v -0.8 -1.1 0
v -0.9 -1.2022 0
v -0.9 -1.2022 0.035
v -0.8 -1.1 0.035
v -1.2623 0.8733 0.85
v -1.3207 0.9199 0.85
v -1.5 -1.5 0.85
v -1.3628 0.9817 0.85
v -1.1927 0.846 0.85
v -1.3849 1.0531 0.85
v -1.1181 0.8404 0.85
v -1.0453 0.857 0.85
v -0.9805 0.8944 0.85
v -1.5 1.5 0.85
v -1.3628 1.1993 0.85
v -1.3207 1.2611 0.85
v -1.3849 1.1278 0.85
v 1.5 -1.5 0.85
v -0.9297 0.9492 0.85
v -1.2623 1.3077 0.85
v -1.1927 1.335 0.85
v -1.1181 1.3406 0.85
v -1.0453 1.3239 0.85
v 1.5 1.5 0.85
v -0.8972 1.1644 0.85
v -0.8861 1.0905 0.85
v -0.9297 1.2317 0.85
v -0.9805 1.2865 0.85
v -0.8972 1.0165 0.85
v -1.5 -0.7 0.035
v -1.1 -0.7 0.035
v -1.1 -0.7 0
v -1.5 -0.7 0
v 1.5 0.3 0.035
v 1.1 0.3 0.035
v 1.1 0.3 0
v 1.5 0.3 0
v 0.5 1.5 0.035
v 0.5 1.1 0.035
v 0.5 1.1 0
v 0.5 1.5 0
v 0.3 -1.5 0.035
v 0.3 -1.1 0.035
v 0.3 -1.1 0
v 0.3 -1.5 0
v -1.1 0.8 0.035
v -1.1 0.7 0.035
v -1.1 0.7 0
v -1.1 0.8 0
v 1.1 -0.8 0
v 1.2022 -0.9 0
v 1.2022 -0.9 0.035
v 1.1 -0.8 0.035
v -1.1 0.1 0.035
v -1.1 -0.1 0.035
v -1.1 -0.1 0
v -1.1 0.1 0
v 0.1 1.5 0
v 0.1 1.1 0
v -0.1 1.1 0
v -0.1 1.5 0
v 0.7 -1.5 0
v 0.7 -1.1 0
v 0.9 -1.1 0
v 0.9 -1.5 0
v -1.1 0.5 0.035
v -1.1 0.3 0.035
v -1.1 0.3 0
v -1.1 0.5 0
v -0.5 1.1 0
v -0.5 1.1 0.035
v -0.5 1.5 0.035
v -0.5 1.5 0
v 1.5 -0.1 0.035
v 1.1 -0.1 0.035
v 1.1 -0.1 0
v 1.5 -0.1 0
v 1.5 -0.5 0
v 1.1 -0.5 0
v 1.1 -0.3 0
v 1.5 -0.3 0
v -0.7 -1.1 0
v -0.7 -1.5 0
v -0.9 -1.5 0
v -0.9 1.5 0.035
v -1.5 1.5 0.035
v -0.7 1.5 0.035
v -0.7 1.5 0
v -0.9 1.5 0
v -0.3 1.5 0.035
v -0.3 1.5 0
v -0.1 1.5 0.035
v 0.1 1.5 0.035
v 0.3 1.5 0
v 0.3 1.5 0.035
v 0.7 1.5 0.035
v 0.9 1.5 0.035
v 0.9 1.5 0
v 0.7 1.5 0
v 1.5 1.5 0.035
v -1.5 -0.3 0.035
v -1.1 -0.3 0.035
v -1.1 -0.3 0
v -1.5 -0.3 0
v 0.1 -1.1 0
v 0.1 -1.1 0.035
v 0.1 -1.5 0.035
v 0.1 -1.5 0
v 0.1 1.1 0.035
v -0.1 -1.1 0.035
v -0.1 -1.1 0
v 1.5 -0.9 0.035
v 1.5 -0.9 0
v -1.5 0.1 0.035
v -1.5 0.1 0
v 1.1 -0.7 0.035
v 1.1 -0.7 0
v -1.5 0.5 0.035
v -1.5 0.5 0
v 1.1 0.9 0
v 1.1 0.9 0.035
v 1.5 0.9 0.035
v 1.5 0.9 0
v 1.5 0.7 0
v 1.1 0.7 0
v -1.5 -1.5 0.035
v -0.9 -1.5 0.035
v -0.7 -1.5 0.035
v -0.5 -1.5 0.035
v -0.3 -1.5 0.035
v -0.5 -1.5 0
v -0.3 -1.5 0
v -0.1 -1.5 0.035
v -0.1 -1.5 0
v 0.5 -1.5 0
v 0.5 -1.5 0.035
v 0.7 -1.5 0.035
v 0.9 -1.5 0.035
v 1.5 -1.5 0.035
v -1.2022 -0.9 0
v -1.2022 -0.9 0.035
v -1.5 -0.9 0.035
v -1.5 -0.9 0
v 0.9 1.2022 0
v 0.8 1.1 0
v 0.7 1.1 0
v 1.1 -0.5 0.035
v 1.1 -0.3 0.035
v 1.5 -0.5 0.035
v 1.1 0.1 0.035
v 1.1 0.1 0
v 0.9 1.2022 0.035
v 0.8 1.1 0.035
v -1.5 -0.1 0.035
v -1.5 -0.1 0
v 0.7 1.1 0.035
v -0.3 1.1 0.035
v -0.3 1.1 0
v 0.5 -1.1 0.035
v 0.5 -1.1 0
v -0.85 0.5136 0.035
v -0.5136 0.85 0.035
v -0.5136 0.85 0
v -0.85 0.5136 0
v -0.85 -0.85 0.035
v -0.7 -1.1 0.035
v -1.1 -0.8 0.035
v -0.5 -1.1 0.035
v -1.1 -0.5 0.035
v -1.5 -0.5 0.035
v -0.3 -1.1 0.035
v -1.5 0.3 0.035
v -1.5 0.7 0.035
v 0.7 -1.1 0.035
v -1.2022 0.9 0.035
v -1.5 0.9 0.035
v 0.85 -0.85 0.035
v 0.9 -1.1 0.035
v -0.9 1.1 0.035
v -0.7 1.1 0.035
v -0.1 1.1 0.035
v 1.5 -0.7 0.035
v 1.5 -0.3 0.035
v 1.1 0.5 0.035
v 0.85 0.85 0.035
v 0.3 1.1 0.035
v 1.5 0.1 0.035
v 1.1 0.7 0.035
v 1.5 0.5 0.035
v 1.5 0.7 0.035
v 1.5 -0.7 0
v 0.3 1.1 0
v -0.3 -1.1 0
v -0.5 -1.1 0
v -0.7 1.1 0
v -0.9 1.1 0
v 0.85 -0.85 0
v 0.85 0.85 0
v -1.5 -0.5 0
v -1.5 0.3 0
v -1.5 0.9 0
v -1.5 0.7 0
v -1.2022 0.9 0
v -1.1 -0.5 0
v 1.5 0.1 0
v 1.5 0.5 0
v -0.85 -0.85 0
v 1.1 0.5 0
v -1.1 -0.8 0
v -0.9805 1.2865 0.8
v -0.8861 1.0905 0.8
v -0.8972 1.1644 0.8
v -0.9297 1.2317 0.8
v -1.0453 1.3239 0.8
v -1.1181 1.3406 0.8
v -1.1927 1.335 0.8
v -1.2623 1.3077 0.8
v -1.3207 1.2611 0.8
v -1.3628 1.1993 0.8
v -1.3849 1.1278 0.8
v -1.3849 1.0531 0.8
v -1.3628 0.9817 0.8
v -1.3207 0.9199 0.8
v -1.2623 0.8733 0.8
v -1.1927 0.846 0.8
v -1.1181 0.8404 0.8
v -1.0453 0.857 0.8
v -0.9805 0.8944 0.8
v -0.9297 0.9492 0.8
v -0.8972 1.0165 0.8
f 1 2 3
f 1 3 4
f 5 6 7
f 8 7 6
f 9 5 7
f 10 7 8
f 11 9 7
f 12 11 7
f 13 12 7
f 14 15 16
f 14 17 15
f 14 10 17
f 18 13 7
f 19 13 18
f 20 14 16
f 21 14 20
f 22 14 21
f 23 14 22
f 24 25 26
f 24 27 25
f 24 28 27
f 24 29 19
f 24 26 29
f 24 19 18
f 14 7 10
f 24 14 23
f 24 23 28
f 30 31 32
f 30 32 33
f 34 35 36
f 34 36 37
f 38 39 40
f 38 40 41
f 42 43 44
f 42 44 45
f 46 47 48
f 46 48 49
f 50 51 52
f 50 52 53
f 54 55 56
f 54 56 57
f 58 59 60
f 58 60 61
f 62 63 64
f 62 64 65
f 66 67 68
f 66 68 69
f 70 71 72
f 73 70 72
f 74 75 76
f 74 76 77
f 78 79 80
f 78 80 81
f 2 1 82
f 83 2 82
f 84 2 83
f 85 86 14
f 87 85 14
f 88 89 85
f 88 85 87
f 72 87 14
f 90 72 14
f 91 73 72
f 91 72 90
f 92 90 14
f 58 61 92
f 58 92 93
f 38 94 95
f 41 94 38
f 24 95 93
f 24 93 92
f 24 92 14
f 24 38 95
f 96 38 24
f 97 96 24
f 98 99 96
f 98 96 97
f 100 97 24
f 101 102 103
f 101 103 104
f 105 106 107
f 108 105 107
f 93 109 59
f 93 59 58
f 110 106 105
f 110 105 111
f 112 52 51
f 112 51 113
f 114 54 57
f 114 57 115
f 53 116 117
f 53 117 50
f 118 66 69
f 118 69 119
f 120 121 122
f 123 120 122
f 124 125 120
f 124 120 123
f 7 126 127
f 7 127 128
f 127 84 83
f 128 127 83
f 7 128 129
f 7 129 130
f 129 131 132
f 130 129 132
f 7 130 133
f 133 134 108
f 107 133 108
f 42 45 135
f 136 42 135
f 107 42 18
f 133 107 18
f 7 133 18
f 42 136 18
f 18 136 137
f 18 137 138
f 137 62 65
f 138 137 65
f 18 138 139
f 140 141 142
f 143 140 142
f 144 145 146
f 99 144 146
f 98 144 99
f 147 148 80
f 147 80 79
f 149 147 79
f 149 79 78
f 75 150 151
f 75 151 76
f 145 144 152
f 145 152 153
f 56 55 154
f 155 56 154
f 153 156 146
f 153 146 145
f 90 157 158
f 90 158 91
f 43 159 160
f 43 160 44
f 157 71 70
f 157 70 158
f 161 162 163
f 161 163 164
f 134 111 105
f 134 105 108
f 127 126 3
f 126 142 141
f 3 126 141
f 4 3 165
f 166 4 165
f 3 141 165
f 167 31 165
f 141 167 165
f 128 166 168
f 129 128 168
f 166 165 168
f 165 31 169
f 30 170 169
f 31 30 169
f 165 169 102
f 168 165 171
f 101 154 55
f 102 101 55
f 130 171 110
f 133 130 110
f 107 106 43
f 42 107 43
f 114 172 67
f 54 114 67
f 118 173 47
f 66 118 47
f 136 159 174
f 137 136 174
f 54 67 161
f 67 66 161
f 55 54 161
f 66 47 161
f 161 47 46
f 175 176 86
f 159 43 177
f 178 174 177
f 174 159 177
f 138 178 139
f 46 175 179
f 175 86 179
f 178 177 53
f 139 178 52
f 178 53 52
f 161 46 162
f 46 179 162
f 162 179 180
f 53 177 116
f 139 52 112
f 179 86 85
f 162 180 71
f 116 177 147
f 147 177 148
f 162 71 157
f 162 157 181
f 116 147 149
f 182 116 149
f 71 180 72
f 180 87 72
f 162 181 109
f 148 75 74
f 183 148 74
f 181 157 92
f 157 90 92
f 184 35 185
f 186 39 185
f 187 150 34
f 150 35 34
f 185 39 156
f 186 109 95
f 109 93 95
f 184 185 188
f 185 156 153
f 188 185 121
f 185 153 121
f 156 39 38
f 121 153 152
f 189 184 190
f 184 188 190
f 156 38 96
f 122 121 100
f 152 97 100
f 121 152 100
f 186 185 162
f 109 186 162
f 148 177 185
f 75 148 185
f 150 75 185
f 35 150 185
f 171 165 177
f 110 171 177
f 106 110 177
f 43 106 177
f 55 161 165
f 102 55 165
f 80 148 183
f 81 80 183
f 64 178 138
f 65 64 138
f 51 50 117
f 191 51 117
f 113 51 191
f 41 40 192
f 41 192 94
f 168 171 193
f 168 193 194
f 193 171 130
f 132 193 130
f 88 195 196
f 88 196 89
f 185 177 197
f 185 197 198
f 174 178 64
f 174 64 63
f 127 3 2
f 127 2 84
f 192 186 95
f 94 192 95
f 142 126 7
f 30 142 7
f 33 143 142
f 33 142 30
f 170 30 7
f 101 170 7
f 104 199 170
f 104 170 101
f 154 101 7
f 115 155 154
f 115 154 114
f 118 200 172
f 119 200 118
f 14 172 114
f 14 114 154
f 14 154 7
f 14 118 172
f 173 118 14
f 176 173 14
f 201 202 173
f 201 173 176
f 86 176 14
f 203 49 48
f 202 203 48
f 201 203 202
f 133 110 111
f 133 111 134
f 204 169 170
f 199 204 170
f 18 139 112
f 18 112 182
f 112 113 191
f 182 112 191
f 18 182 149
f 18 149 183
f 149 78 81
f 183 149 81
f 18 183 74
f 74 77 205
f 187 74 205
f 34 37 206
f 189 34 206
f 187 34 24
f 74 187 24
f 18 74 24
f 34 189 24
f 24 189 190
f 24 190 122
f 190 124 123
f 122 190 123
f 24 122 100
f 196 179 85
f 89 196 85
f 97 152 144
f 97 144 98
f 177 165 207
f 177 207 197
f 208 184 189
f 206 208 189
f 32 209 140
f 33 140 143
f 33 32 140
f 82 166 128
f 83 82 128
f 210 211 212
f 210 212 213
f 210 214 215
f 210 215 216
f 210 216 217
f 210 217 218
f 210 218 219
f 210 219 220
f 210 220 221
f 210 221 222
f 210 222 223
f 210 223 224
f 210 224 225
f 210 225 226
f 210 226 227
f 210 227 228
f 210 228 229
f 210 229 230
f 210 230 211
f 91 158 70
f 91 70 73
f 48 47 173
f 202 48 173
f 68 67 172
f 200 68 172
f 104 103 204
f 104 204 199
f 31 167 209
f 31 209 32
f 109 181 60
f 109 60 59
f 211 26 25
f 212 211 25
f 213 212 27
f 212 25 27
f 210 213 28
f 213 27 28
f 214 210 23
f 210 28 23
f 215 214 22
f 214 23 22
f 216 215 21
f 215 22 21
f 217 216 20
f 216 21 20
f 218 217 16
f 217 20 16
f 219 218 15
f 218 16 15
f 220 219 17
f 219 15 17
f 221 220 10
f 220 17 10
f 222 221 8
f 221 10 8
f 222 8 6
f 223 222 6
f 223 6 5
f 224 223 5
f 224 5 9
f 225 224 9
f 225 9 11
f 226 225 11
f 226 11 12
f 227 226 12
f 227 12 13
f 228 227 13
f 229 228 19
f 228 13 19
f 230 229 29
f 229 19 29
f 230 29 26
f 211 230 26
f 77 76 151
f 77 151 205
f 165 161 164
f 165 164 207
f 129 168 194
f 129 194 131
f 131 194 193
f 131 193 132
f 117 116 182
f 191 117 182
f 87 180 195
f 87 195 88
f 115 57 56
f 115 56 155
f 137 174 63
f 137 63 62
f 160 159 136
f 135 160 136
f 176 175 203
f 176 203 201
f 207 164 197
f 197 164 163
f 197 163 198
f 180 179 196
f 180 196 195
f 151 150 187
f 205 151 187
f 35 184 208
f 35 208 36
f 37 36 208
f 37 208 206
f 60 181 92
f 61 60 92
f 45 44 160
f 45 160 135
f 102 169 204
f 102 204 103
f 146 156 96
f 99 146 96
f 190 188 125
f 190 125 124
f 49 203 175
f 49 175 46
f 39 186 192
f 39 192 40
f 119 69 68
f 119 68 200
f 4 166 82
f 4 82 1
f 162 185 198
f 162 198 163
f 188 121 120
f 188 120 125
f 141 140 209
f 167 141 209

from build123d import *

# Parameters (mm, degrees)
BOSS_EXTRUDE1_START          = 0.035
SKETCH1_W                    = 3
SKETCH1_H                    = 3
BOSS_EXTRUDE1_DEPTH          = 0.815
SKETCH2_R                    = 0.250796372
CUT_EXTRUDE3_DEPTH           = 0.05
SKETCH3_W                    = 0.4
SKETCH3_H                    = 0.2
BOSS_EXTRUDE2_DEPTH          = 0.035
LPATTERN1_COUNT              = 5
LPATTERN1_PITCH              = 0.4
CUT_EXTRUDE4_DEPTH           = 0.035
CIRPATTERN1_COUNT            = 4
CIRPATTERN1_COPY_1_SKETCH_W  = 0.4
CIRPATTERN1_COPY_1_SKETCH_H  = 0.2
CIRPATTERN1_COPY_1_DEPTH     = 0.035
CIRPATTERN1_COPY_2_SKETCH_W  = 0.4
CIRPATTERN1_COPY_2_SKETCH_H  = 0.2
CIRPATTERN1_COPY_2_DEPTH     = 0.035
CIRPATTERN1_COPY_3_SKETCH_W  = 0.4
CIRPATTERN1_COPY_3_SKETCH_H  = 0.2
CIRPATTERN1_COPY_3_DEPTH     = 0.035
CIRPATTERN1_COPY_4_SKETCH_W  = 0.4
CIRPATTERN1_COPY_4_SKETCH_H  = 0.2
CIRPATTERN1_COPY_4_DEPTH     = 0.035
CIRPATTERN1_COPY_5_SKETCH_W  = 0.4
CIRPATTERN1_COPY_5_SKETCH_H  = 0.2
CIRPATTERN1_COPY_5_DEPTH     = 0.035
CIRPATTERN1_COPY_6_SKETCH_W  = 0.4
CIRPATTERN1_COPY_6_SKETCH_H  = 0.2
CIRPATTERN1_COPY_6_DEPTH     = 0.035
CIRPATTERN1_COPY_7_SKETCH_W  = 0.4
CIRPATTERN1_COPY_7_SKETCH_H  = 0.2
CIRPATTERN1_COPY_7_DEPTH     = 0.035
CIRPATTERN1_COPY_8_SKETCH_W  = 0.4
CIRPATTERN1_COPY_8_SKETCH_H  = 0.2
CIRPATTERN1_COPY_8_DEPTH     = 0.035
CIRPATTERN1_COPY_9_SKETCH_W  = 0.4
CIRPATTERN1_COPY_9_SKETCH_H  = 0.2
CIRPATTERN1_COPY_9_DEPTH     = 0.035
CIRPATTERN1_COPY_10_SKETCH_W = 0.4
CIRPATTERN1_COPY_10_SKETCH_H = 0.2
CIRPATTERN1_COPY_10_DEPTH    = 0.035
CIRPATTERN1_COPY_11_SKETCH_W = 0.4
CIRPATTERN1_COPY_11_SKETCH_H = 0.2
CIRPATTERN1_COPY_11_DEPTH    = 0.035
CIRPATTERN1_COPY_12_SKETCH_W = 0.4
CIRPATTERN1_COPY_12_SKETCH_H = 0.2
CIRPATTERN1_COPY_12_DEPTH    = 0.035
BOSS_EXTRUDE3_DEPTH          = 0.035


with BuildPart() as part:
    # Sketch1 → Boss-Extrude1 (new body)
    with BuildSketch(Plane.XY.offset(BOSS_EXTRUDE1_START)):
        Rectangle(SKETCH1_W, SKETCH1_H)
    extrude(amount=BOSS_EXTRUDE1_DEPTH)

    # Sketch2 → Cut-Extrude3 (cut)
    with BuildSketch(Plane.XY.offset(0.85)):
        with Locations((-1.136881167, 1.09046913)):
            Circle(SKETCH2_R)
    extrude(amount=-CUT_EXTRUDE3_DEPTH, mode=Mode.SUBTRACT)

    # Sketch3 → Boss-Extrude2 (add)
    with BuildSketch(Plane(origin=(0, 0, 0.035), x_dir=(-1, 0, 0), z_dir=(0, 0, -1))):
        with Locations((1.3, 0.8)):
            Rectangle(SKETCH3_W, SKETCH3_H)
    boss_extrude2 = extrude(amount=BOSS_EXTRUDE2_DEPTH)

    # LPattern1: Boss-Extrude2 ×5
    with Locations(*[(0, -i * LPATTERN1_PITCH, 0) for i in range(1, LPATTERN1_COUNT)]):
        add(boss_extrude2)

    # Sketch4 → Cut-Extrude4 (cut)
    with BuildSketch(Plane(origin=(0, 0, 0), x_dir=(-1, 0, 0), z_dir=(0, 0, -1))):
        Polygon((1.202167592, 0.9), (1.1, 0.8), (1.1, 0.9), align=None)
    cut_extrude4 = extrude(amount=-CUT_EXTRUDE4_DEPTH, mode=Mode.SUBTRACT)

    # Mirror1: Cut-Extrude4 across plane
    add(cut_extrude4.mirror(Plane.ZX), mode=Mode.SUBTRACT)

    # CirPattern1: Boss-Extrude2, Cut-Extrude4 ×4 about axis
    cirpattern1_axis = Axis((0, 0, 0), (0, 0, 1))
    add([boss_extrude2.rotate(cirpattern1_axis, i * 360 / CIRPATTERN1_COUNT) for i in range(1, CIRPATTERN1_COUNT)])
    add([cut_extrude4.rotate(cirpattern1_axis, i * 360 / CIRPATTERN1_COUNT) for i in range(1, CIRPATTERN1_COUNT)], mode=Mode.SUBTRACT)

    # CirPattern1 copy 1 sketch → CirPattern1 copy 1 (add)
    with BuildSketch(Plane(origin=(0.4, 0, 0.035), x_dir=(0, -1, 0), z_dir=(0, 0, -1))):
        with Locations((1.3, 0.8)):
            Rectangle(CIRPATTERN1_COPY_1_SKETCH_W, CIRPATTERN1_COPY_1_SKETCH_H)
    extrude(amount=CIRPATTERN1_COPY_1_DEPTH)

    # CirPattern1 copy 2 sketch → CirPattern1 copy 2 (add)
    with BuildSketch(Plane(origin=(0, 0.4, 0.035), x_dir=(1, 0, 0), z_dir=(0, 0, -1))):
        with Locations((1.3, 0.8)):
            Rectangle(CIRPATTERN1_COPY_2_SKETCH_W, CIRPATTERN1_COPY_2_SKETCH_H)
    extrude(amount=CIRPATTERN1_COPY_2_DEPTH)

    # CirPattern1 copy 3 sketch → CirPattern1 copy 3 (add)
    with BuildSketch(Plane(origin=(-0.4, 0, 0.035), x_dir=(0, 1, 0), z_dir=(0, 0, -1))):
        with Locations((1.3, 0.8)):
            Rectangle(CIRPATTERN1_COPY_3_SKETCH_W, CIRPATTERN1_COPY_3_SKETCH_H)
    extrude(amount=CIRPATTERN1_COPY_3_DEPTH)

    # CirPattern1 copy 4 sketch → CirPattern1 copy 4 (add)
    with BuildSketch(Plane(origin=(0.8, 0, 0.035), x_dir=(0, -1, 0), z_dir=(0, 0, -1))):
        with Locations((1.3, 0.8)):
            Rectangle(CIRPATTERN1_COPY_4_SKETCH_W, CIRPATTERN1_COPY_4_SKETCH_H)
    extrude(amount=CIRPATTERN1_COPY_4_DEPTH)

    # CirPattern1 copy 5 sketch → CirPattern1 copy 5 (add)
    with BuildSketch(Plane(origin=(0, 0.8, 0.035), x_dir=(1, 0, 0), z_dir=(0, 0, -1))):
        with Locations((1.3, 0.8)):
            Rectangle(CIRPATTERN1_COPY_5_SKETCH_W, CIRPATTERN1_COPY_5_SKETCH_H)
    extrude(amount=CIRPATTERN1_COPY_5_DEPTH)

    # CirPattern1 copy 6 sketch → CirPattern1 copy 6 (add)
    with BuildSketch(Plane(origin=(-0.8, 0, 0.035), x_dir=(0, 1, 0), z_dir=(0, 0, -1))):
        with Locations((1.3, 0.8)):
            Rectangle(CIRPATTERN1_COPY_6_SKETCH_W, CIRPATTERN1_COPY_6_SKETCH_H)
    extrude(amount=CIRPATTERN1_COPY_6_DEPTH)

    # CirPattern1 copy 7 sketch → CirPattern1 copy 7 (add)
    with BuildSketch(Plane(origin=(1.2, 0, 0.035), x_dir=(0, -1, 0), z_dir=(0, 0, -1))):
        with Locations((1.3, 0.8)):
            Rectangle(CIRPATTERN1_COPY_7_SKETCH_W, CIRPATTERN1_COPY_7_SKETCH_H)
    extrude(amount=CIRPATTERN1_COPY_7_DEPTH)

    # CirPattern1 copy 8 sketch → CirPattern1 copy 8 (add)
    with BuildSketch(Plane(origin=(0, 1.2, 0.035), x_dir=(1, 0, 0), z_dir=(0, 0, -1))):
        with Locations((1.3, 0.8)):
            Rectangle(CIRPATTERN1_COPY_8_SKETCH_W, CIRPATTERN1_COPY_8_SKETCH_H)
    extrude(amount=CIRPATTERN1_COPY_8_DEPTH)

    # CirPattern1 copy 9 sketch → CirPattern1 copy 9 (add)
    with BuildSketch(Plane(origin=(-1.2, 0, 0.035), x_dir=(0, 1, 0), z_dir=(0, 0, -1))):
        with Locations((1.3, 0.8)):
            Rectangle(CIRPATTERN1_COPY_9_SKETCH_W, CIRPATTERN1_COPY_9_SKETCH_H)
    extrude(amount=CIRPATTERN1_COPY_9_DEPTH)

    # CirPattern1 copy 10 sketch → CirPattern1 copy 10 (add)
    with BuildSketch(Plane(origin=(1.6, 0, 0.035), x_dir=(0, -1, 0), z_dir=(0, 0, -1))):
        with Locations((1.3, 0.8)):
            Rectangle(CIRPATTERN1_COPY_10_SKETCH_W, CIRPATTERN1_COPY_10_SKETCH_H)
    extrude(amount=CIRPATTERN1_COPY_10_DEPTH)

    # CirPattern1 copy 11 sketch → CirPattern1 copy 11 (add)
    with BuildSketch(Plane(origin=(0, 1.6, 0.035), x_dir=(1, 0, 0), z_dir=(0, 0, -1))):
        with Locations((1.3, 0.8)):
            Rectangle(CIRPATTERN1_COPY_11_SKETCH_W, CIRPATTERN1_COPY_11_SKETCH_H)
    extrude(amount=CIRPATTERN1_COPY_11_DEPTH)

    # CirPattern1 copy 12 sketch → CirPattern1 copy 12 (add)
    with BuildSketch(Plane(origin=(-1.6, 0, 0.035), x_dir=(0, 1, 0), z_dir=(0, 0, -1))):
        with Locations((1.3, 0.8)):
            Rectangle(CIRPATTERN1_COPY_12_SKETCH_W, CIRPATTERN1_COPY_12_SKETCH_H)
    extrude(amount=CIRPATTERN1_COPY_12_DEPTH)

    # Sketch5 → Boss-Extrude3 (add)
    with BuildSketch(Plane(origin=(0, 0, 0.035), x_dir=(-1, 0, 0), z_dir=(0, 0, -1))):
        Polygon((0.513555447, 0.85), (0.85, 0.513555447), (0.85, -0.85), (-0.85, -0.85), (-0.85, 0.85), align=None)
    extrude(amount=BOSS_EXTRUDE3_DEPTH)


solid = part.part
